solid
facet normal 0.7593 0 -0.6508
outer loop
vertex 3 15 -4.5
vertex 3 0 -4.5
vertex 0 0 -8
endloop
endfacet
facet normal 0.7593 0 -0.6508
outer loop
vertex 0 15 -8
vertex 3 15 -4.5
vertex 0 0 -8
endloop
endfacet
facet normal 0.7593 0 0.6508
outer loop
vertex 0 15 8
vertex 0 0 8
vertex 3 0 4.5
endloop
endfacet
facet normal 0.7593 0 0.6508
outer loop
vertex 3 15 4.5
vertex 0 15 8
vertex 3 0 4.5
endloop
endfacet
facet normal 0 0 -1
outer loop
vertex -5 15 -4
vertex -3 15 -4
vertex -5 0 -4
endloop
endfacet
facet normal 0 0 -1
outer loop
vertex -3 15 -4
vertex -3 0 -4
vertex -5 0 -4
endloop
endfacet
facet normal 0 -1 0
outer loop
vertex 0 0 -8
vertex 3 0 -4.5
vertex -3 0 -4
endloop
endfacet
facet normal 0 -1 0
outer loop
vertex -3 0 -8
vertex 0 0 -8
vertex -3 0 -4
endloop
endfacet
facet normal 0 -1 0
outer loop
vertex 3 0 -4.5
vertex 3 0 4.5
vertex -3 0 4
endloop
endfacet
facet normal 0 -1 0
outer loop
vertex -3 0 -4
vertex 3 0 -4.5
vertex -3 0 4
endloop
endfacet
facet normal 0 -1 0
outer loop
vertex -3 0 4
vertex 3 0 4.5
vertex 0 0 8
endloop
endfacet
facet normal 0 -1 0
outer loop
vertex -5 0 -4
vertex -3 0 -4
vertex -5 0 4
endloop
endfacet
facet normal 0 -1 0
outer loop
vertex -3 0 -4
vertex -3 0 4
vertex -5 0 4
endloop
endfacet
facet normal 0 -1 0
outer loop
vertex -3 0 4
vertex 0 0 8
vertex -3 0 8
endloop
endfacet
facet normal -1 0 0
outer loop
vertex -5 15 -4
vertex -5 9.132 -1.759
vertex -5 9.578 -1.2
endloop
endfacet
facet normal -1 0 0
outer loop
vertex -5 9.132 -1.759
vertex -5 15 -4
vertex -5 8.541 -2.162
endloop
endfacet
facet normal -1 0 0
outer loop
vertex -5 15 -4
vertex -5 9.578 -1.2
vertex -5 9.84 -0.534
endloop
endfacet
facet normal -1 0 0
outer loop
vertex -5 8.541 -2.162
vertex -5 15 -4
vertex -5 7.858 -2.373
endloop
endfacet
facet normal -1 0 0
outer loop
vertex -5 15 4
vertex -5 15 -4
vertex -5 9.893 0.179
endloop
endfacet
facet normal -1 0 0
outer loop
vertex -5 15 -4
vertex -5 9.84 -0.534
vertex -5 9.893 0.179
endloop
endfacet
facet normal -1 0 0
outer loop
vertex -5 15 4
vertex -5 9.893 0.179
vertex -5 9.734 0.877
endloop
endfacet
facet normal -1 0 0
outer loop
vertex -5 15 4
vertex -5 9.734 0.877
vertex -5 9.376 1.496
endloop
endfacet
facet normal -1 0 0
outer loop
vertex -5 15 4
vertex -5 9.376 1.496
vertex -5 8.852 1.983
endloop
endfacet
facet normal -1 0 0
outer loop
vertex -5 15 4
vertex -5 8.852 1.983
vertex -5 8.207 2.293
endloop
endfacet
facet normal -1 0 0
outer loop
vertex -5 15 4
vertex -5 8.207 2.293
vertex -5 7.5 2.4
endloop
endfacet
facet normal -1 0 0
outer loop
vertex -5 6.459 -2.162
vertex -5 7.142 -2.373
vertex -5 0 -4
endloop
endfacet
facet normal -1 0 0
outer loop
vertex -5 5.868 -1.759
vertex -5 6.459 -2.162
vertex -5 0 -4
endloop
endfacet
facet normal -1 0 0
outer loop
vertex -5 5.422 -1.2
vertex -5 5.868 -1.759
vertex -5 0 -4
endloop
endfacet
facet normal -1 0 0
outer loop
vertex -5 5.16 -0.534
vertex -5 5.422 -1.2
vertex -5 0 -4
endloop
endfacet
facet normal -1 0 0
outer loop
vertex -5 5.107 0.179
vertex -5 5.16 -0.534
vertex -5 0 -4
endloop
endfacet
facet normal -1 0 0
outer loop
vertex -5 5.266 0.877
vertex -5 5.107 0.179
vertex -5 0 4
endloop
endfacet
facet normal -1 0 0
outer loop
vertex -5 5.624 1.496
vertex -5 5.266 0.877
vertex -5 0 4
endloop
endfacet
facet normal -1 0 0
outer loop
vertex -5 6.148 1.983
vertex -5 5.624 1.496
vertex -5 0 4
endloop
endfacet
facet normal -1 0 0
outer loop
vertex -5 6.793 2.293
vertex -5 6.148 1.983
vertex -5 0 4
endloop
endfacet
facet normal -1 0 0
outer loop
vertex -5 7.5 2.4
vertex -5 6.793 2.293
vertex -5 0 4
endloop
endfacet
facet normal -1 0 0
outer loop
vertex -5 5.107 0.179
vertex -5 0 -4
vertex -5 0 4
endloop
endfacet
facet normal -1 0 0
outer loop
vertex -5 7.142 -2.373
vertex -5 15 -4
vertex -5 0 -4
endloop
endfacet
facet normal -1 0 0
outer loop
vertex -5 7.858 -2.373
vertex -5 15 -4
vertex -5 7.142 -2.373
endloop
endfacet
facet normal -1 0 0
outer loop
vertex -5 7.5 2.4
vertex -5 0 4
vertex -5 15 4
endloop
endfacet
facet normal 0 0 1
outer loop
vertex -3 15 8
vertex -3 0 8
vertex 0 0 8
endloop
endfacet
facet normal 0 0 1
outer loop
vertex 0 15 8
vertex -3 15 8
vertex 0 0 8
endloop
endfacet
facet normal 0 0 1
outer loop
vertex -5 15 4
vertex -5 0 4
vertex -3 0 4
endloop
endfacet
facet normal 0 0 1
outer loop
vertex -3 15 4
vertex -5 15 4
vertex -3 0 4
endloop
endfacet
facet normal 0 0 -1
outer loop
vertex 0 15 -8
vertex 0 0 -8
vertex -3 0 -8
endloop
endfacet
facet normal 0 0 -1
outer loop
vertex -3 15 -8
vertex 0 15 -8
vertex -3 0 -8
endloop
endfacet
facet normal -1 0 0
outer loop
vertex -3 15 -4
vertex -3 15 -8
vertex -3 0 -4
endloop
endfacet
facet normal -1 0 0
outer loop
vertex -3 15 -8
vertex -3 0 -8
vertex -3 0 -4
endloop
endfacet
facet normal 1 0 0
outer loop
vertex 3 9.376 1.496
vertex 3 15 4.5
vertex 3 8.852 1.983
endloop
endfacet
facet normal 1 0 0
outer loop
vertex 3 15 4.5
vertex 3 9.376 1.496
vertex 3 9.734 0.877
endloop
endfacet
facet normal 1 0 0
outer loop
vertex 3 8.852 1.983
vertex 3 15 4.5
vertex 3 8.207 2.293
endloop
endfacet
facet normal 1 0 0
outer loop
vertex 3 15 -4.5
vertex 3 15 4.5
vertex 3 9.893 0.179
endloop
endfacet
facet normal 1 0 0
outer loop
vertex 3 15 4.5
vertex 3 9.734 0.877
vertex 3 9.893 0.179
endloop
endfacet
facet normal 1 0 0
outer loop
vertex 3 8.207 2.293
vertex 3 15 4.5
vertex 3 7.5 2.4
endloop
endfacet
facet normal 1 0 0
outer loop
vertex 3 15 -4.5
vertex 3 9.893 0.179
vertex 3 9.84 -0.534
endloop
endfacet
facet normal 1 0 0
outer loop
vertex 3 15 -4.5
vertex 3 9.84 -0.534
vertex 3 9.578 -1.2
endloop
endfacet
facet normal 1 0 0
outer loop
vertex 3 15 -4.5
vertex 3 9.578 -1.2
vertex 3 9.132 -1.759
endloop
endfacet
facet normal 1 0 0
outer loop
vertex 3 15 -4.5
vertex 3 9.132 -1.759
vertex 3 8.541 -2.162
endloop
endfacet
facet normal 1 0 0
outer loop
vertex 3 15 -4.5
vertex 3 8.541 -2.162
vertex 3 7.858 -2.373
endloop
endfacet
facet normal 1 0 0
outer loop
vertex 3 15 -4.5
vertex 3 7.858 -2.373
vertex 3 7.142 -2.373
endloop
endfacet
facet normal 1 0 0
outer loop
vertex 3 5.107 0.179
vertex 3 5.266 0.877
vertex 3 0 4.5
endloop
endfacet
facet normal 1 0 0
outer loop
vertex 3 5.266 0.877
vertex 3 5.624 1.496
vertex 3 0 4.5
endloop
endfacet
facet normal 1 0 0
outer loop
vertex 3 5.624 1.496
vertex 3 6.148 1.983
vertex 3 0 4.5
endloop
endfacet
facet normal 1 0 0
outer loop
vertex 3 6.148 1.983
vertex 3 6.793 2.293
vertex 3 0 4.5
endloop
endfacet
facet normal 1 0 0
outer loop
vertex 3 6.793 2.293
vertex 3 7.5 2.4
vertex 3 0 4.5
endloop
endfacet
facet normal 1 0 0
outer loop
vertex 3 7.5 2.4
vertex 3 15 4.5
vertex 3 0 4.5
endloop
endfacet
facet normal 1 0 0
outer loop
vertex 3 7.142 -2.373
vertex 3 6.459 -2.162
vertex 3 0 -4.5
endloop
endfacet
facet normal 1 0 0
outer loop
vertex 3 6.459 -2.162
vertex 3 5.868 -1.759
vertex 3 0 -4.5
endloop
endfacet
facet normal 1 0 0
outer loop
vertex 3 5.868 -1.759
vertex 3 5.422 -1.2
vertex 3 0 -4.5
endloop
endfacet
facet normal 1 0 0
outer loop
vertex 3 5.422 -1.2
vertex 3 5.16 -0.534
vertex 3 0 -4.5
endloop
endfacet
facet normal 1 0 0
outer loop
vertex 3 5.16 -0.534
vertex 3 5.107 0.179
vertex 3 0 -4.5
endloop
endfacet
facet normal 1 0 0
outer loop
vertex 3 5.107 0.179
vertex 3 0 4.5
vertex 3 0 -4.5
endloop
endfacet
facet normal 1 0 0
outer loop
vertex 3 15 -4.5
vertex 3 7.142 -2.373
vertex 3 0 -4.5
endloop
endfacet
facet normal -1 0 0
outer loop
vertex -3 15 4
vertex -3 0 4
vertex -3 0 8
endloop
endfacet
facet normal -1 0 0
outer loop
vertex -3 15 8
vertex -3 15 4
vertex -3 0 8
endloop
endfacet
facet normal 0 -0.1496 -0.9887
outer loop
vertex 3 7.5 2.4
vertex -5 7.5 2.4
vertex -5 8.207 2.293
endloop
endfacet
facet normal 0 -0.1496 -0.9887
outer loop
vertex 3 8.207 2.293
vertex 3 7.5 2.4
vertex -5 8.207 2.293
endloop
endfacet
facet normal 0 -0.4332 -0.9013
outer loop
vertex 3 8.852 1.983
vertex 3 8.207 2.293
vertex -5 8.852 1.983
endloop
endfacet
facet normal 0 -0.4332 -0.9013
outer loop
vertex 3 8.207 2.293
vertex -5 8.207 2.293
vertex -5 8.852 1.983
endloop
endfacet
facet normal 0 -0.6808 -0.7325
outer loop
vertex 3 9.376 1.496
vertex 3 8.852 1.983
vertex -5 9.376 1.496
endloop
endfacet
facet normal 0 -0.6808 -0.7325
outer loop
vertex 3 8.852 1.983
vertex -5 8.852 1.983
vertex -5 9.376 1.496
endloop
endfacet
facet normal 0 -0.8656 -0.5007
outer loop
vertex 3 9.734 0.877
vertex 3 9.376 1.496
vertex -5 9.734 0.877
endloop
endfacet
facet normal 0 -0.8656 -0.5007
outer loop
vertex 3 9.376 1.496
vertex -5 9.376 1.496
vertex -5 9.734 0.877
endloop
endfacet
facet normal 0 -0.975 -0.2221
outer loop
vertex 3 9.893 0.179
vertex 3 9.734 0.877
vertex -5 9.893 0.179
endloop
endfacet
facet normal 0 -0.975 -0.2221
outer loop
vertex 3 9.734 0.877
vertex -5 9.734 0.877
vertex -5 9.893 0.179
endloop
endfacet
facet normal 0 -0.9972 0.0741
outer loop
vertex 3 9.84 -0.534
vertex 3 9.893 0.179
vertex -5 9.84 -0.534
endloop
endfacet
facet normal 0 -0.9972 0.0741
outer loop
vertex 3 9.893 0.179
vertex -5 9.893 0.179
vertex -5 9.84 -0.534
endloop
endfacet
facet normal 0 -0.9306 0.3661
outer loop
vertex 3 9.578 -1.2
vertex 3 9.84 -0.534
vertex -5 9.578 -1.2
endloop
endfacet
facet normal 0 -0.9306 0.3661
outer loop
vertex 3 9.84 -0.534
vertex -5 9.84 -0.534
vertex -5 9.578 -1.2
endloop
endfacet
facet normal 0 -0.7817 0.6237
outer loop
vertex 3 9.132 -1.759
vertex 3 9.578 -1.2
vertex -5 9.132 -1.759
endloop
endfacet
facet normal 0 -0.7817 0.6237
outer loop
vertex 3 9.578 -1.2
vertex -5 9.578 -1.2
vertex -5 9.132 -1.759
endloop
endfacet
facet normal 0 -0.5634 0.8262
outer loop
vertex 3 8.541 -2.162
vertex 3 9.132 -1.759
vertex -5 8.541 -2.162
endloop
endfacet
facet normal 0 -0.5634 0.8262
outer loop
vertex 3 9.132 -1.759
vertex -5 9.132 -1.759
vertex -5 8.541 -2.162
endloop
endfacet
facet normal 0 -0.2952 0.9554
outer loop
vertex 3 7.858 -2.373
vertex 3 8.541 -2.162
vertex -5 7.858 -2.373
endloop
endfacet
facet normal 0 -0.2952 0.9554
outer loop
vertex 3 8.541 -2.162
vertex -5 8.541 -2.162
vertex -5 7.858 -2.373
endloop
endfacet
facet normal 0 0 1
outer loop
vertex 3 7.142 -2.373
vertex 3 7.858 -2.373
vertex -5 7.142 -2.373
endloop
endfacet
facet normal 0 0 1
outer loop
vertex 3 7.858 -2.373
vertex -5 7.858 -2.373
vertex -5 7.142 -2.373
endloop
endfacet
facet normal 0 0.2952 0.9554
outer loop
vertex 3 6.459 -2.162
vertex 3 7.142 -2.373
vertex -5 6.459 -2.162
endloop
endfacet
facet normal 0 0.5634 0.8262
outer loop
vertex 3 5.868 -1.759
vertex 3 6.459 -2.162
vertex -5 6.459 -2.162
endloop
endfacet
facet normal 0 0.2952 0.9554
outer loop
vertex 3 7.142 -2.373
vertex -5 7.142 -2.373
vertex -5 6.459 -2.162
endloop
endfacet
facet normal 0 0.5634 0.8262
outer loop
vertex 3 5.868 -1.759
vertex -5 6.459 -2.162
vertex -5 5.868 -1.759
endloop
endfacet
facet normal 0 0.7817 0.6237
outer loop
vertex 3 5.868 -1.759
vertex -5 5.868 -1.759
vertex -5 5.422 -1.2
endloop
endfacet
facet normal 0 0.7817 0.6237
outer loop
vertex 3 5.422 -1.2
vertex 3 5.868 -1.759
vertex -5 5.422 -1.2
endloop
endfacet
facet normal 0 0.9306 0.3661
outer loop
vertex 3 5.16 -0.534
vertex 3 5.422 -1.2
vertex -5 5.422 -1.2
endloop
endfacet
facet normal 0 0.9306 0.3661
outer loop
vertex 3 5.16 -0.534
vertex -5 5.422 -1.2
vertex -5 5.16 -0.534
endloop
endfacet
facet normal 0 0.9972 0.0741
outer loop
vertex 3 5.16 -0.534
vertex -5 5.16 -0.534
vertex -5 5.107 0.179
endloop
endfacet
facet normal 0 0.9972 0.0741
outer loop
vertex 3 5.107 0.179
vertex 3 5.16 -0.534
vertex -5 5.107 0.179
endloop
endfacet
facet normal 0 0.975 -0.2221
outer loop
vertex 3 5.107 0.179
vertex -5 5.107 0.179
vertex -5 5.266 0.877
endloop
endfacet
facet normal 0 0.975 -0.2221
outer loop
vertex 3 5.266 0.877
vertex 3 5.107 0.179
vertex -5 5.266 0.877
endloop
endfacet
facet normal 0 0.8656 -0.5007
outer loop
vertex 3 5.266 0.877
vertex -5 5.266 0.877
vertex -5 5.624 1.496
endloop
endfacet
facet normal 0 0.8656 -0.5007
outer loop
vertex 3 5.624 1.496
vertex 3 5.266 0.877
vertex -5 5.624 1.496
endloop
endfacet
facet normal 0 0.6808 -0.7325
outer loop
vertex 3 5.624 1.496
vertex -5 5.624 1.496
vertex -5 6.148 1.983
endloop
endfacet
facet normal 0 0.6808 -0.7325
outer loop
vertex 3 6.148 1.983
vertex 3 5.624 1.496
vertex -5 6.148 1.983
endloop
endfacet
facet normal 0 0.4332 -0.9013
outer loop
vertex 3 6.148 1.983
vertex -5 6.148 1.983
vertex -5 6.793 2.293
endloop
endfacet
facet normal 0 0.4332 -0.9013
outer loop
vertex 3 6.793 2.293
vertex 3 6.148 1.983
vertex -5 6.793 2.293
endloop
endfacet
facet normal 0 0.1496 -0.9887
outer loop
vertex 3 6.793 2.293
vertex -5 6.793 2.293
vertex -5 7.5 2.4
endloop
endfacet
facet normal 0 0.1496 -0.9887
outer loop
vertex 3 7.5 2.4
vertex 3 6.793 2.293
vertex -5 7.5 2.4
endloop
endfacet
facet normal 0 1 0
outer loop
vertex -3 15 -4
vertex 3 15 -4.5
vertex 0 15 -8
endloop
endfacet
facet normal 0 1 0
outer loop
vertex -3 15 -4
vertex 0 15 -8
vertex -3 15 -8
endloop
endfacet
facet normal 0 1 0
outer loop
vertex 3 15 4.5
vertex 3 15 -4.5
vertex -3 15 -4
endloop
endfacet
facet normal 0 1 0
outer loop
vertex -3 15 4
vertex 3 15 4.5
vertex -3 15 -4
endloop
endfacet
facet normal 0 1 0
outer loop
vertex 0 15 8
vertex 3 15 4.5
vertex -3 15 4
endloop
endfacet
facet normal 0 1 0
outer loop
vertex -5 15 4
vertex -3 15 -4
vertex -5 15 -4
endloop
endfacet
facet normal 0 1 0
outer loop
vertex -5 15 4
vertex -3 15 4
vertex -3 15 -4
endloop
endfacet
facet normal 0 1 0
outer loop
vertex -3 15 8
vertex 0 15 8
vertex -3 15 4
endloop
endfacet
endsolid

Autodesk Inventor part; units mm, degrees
ref_plane "YZ Plane" through (0, 0, 0) normal (1, 0, 0) x (0, 1, 0)
ref_plane "XZ Plane" through (0, 0, 0) normal (0, 1, 0) x (-1, 0, 0)
ref_plane "XY Plane" through (0, 0, 0) normal (0, 0, 1) x (1, 0, 0)
sketch "Sketch1" plane through (0, 0, 0) normal (0, 1, 0) x (-1, 0, 0)
  line L0 (3, 8) -> (-3, 8)
  line L1 (-3, 8) -> (-3, -8)
  line L2 (-3, -8) -> (3, -8)
  line L3 (3, -8) -> (3, 8)
  line L4 (3, 8) -> (-3, -8) construction
  line L5 (-3, 8) -> (3, -8) construction
  line L6 (5, 4) -> (1, 4)
  line L7 (1, 4) -> (1, -4)
  line L8 (1, -4) -> (5, -4)
  line L9 (5, -4) -> (5, 4)
  line L10 (5, 4) -> (1, -4) construction
  line L11 (1, 4) -> (5, -4) construction
  line L12 (0, 8) -> (-3, 4.5)
  line L13 (-3, -4.5) -> (0, -8)
  point P0 (0, 0)
  point P1 (3, 0)
  point P2 (-3, 0)
  point P3 (3, 4)
  point P4 (3, -4)
  dimension "d0" = 6
  dimension "d1" = 16
  dimension "d2" = 4
  dimension "d3" = 8
  dimension "d4" = 3
  dimension "d5" = 3
  dimension "d6" = 9
  dimension "d7" = 4.5
extrude "Extrusion1" add sketch "Sketch1" along normal blind 15 contours L3 L6 L7 L8 L2 L13 L1 L12 L0 | L6 L9 L8 L3 | L3 L8 L7 L6
sketch "Sketch2" plane through (-5, 0, -4) normal (-1, 0, 0) x (0, 0, 1)
  circle A0 centre (4, 7.5) radius 2.4
  line L0 (0, 0) -> (8, 0) projected
  line L1 (8, 0) -> (8, 15) projected
  point P0 (4, 0)
  dimension "d10" = 4.8
  dimension "d11" = 7.5
  dimension "d12" = 4
extrude "Extrusion2" cut sketch "Sketch2" against normal through all
properties part number "drazkaVel"
